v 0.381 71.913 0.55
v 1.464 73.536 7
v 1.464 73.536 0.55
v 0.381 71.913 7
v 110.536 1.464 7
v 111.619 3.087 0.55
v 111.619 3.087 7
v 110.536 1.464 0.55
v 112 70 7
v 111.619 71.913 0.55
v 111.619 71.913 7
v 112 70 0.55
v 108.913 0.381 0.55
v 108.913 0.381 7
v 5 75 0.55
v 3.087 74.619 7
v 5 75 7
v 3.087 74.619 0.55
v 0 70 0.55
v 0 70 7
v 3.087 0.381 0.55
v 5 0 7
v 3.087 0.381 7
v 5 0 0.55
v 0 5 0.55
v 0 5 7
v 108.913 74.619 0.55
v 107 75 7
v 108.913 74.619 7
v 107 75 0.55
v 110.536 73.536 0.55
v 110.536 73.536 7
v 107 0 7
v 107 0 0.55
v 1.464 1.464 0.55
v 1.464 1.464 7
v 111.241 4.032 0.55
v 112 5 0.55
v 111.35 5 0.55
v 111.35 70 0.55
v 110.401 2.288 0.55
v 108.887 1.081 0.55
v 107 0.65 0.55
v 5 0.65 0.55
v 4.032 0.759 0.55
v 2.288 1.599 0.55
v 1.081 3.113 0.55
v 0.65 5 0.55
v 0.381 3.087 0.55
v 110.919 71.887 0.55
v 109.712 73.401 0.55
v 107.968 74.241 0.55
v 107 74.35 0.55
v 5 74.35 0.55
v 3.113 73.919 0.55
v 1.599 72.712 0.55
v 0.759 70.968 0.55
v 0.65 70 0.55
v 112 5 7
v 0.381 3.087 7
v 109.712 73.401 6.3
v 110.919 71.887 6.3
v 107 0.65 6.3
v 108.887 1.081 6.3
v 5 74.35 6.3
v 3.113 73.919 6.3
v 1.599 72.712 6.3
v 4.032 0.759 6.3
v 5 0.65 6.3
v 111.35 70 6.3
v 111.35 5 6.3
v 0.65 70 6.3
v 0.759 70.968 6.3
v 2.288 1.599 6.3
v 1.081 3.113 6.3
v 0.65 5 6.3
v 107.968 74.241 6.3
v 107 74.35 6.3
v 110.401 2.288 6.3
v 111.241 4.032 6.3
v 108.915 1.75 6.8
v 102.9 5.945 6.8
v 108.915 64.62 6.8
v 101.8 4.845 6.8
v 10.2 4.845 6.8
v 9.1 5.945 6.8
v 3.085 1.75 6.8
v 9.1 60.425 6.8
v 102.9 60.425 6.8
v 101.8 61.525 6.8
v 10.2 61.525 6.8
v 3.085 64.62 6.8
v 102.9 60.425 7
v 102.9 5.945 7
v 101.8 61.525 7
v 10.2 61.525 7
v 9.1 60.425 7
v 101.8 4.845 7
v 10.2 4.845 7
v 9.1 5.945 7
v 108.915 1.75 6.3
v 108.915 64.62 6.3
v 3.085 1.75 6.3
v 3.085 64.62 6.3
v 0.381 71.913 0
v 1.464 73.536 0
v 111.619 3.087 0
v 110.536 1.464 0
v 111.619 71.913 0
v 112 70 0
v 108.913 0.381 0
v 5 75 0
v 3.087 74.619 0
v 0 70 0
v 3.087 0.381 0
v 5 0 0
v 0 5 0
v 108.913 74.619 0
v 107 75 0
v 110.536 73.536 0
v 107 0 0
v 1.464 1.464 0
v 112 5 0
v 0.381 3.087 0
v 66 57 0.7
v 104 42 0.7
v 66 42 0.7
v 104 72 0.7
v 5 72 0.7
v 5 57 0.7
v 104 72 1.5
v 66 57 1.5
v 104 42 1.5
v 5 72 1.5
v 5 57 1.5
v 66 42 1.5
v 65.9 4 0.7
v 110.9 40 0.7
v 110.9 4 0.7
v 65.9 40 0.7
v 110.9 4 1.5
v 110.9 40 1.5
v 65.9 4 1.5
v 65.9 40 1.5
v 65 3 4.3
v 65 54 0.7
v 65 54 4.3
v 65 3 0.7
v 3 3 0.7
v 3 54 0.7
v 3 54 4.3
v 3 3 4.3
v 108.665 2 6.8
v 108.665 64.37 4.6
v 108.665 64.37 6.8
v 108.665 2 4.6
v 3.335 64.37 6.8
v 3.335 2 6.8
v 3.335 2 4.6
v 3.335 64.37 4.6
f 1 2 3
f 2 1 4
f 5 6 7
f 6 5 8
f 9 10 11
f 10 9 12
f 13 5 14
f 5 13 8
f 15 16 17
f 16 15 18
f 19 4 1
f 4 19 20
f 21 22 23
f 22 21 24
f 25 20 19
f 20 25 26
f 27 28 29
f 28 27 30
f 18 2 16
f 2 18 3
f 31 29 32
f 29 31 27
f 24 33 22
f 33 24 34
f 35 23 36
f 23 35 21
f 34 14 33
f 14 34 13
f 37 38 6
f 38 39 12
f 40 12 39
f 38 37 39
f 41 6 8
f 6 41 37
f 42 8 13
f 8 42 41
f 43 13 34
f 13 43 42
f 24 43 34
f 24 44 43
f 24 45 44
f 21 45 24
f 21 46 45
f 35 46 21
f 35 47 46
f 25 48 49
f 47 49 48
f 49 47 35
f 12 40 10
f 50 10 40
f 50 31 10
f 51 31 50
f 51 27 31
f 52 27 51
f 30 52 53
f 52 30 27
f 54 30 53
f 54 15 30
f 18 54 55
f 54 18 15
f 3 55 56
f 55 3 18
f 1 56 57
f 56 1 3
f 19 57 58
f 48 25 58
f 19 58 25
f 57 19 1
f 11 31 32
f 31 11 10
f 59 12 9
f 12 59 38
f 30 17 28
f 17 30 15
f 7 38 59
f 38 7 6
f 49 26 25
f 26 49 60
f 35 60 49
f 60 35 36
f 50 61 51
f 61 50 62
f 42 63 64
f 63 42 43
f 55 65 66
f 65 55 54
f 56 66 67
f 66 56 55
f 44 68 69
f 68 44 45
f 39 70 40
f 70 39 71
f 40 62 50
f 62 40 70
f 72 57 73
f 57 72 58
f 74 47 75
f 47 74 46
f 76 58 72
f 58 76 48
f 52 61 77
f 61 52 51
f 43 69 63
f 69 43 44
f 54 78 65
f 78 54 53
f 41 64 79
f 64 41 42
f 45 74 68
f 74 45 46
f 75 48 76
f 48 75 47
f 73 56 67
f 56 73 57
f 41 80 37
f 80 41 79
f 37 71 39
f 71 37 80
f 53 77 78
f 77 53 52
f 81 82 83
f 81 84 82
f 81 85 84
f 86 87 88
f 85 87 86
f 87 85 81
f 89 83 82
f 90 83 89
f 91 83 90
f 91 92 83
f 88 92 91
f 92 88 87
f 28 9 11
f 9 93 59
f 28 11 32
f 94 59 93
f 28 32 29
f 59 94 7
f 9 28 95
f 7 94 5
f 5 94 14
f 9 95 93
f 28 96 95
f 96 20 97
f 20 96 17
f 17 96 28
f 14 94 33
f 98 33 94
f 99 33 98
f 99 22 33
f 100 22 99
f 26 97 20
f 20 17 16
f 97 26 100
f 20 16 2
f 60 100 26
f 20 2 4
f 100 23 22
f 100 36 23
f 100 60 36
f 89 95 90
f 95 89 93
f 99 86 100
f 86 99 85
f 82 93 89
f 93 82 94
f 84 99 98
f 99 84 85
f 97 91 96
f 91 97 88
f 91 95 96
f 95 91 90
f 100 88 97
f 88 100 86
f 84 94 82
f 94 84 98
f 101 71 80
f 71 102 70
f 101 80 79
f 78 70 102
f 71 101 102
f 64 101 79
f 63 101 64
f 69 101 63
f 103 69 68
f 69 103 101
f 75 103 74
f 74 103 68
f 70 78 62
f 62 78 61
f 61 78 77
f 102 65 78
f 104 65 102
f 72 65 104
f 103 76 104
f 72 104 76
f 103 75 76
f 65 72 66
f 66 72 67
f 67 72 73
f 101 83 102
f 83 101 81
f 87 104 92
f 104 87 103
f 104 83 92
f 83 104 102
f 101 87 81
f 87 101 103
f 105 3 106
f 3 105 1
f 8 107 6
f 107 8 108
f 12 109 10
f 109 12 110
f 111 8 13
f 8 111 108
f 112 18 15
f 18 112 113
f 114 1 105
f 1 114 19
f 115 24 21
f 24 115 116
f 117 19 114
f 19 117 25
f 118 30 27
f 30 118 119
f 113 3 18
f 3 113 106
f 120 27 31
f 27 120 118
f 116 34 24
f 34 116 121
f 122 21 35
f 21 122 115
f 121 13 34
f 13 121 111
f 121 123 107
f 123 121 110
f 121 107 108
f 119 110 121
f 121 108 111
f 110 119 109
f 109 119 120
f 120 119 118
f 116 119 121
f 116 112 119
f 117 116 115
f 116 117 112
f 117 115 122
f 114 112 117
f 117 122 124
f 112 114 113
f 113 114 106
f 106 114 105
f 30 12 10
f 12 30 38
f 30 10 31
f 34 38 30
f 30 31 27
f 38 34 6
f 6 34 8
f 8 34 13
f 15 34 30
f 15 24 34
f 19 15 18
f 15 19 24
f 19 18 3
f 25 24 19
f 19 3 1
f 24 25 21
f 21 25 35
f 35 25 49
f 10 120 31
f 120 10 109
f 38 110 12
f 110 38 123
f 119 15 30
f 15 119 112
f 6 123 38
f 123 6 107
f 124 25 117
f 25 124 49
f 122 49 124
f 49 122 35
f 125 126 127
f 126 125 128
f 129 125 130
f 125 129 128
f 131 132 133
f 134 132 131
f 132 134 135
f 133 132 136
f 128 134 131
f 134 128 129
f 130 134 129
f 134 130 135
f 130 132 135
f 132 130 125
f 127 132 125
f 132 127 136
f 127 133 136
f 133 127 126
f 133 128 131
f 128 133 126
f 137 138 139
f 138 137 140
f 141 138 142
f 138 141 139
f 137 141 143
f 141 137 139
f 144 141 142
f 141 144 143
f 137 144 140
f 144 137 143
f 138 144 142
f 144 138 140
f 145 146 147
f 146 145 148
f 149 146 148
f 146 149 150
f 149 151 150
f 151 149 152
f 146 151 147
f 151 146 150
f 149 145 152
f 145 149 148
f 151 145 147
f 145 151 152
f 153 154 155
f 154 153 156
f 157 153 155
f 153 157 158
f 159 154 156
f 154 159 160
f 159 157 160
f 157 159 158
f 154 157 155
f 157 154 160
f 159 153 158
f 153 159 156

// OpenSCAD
// Thin7 MECHANICAL PARTITION; empty PCB outlines, not fabrication inputs.
// Panel/pouch/connector/support tolerances and routing are not qualified.
module slab(r,z,h){translate([r[0],r[1],z])cube([r[2]-r[0],r[3]-r[1],h]);}
module rounded(w,h,r,z){translate([r,r,0])linear_extrude(height=z)offset(r=r)square([w-2*r,h-2*r]);}
color([.1,.12,.14])rounded(112,75,5,.55);
color([.1,.12,.14])translate([0,0,.55])difference(){rounded(112,75,5,5.75);translate([.65,.65,-.01])rounded(110.7,73.7,4.35,5.77);}
color([.1,.12,.14])translate([0,0,6.8])difference(){rounded(112,75,5,.2);translate([10.2,5.945,-.01])linear_extrude(height=.22)offset(r=1.1)square([91.6,54.48]);}
color([.1,.12,.14])translate([0,0,6.3])difference(){rounded(112,75,5,.5);translate([3.085,1.75,-.01])cube([105.83,62.87,.52]);}
color([.05,.4,.22])translate([0,0,0.7])linear_extrude(height=.8)polygon([[5, 57], [66, 57], [66, 42], [104, 42], [104, 72], [5, 72]]); // Core-Thin7 EMPTY TEMPLATE
color([.06,.23,.38])translate([0,0,0.7])linear_extrude(height=.8)polygon([[65.9, 4], [110.9, 4], [110.9, 40], [65.9, 40]]); // Display-Thin7 EMPTY TEMPLATE
color([.65,.66,.63])slab([3, 3, 65, 54],.7,3.1); // complete-pack MAX requirement; not selected SKU
color([1,.6,.1,.20])slab([3, 3, 65, 54],3.8,.5); // swelling space, must remain empty
color([.17,.17,.17,.35])slab([3.335, 2.0, 108.665, 64.37],4.6,2.2); // panel thickness budget
// Border frame covers the inactive panel area ABOVE6.8 only; underside pocket avoids solid overlap.
// Uniform outer thickness7.0mm; no scaled native PCB/module/component bodies.
